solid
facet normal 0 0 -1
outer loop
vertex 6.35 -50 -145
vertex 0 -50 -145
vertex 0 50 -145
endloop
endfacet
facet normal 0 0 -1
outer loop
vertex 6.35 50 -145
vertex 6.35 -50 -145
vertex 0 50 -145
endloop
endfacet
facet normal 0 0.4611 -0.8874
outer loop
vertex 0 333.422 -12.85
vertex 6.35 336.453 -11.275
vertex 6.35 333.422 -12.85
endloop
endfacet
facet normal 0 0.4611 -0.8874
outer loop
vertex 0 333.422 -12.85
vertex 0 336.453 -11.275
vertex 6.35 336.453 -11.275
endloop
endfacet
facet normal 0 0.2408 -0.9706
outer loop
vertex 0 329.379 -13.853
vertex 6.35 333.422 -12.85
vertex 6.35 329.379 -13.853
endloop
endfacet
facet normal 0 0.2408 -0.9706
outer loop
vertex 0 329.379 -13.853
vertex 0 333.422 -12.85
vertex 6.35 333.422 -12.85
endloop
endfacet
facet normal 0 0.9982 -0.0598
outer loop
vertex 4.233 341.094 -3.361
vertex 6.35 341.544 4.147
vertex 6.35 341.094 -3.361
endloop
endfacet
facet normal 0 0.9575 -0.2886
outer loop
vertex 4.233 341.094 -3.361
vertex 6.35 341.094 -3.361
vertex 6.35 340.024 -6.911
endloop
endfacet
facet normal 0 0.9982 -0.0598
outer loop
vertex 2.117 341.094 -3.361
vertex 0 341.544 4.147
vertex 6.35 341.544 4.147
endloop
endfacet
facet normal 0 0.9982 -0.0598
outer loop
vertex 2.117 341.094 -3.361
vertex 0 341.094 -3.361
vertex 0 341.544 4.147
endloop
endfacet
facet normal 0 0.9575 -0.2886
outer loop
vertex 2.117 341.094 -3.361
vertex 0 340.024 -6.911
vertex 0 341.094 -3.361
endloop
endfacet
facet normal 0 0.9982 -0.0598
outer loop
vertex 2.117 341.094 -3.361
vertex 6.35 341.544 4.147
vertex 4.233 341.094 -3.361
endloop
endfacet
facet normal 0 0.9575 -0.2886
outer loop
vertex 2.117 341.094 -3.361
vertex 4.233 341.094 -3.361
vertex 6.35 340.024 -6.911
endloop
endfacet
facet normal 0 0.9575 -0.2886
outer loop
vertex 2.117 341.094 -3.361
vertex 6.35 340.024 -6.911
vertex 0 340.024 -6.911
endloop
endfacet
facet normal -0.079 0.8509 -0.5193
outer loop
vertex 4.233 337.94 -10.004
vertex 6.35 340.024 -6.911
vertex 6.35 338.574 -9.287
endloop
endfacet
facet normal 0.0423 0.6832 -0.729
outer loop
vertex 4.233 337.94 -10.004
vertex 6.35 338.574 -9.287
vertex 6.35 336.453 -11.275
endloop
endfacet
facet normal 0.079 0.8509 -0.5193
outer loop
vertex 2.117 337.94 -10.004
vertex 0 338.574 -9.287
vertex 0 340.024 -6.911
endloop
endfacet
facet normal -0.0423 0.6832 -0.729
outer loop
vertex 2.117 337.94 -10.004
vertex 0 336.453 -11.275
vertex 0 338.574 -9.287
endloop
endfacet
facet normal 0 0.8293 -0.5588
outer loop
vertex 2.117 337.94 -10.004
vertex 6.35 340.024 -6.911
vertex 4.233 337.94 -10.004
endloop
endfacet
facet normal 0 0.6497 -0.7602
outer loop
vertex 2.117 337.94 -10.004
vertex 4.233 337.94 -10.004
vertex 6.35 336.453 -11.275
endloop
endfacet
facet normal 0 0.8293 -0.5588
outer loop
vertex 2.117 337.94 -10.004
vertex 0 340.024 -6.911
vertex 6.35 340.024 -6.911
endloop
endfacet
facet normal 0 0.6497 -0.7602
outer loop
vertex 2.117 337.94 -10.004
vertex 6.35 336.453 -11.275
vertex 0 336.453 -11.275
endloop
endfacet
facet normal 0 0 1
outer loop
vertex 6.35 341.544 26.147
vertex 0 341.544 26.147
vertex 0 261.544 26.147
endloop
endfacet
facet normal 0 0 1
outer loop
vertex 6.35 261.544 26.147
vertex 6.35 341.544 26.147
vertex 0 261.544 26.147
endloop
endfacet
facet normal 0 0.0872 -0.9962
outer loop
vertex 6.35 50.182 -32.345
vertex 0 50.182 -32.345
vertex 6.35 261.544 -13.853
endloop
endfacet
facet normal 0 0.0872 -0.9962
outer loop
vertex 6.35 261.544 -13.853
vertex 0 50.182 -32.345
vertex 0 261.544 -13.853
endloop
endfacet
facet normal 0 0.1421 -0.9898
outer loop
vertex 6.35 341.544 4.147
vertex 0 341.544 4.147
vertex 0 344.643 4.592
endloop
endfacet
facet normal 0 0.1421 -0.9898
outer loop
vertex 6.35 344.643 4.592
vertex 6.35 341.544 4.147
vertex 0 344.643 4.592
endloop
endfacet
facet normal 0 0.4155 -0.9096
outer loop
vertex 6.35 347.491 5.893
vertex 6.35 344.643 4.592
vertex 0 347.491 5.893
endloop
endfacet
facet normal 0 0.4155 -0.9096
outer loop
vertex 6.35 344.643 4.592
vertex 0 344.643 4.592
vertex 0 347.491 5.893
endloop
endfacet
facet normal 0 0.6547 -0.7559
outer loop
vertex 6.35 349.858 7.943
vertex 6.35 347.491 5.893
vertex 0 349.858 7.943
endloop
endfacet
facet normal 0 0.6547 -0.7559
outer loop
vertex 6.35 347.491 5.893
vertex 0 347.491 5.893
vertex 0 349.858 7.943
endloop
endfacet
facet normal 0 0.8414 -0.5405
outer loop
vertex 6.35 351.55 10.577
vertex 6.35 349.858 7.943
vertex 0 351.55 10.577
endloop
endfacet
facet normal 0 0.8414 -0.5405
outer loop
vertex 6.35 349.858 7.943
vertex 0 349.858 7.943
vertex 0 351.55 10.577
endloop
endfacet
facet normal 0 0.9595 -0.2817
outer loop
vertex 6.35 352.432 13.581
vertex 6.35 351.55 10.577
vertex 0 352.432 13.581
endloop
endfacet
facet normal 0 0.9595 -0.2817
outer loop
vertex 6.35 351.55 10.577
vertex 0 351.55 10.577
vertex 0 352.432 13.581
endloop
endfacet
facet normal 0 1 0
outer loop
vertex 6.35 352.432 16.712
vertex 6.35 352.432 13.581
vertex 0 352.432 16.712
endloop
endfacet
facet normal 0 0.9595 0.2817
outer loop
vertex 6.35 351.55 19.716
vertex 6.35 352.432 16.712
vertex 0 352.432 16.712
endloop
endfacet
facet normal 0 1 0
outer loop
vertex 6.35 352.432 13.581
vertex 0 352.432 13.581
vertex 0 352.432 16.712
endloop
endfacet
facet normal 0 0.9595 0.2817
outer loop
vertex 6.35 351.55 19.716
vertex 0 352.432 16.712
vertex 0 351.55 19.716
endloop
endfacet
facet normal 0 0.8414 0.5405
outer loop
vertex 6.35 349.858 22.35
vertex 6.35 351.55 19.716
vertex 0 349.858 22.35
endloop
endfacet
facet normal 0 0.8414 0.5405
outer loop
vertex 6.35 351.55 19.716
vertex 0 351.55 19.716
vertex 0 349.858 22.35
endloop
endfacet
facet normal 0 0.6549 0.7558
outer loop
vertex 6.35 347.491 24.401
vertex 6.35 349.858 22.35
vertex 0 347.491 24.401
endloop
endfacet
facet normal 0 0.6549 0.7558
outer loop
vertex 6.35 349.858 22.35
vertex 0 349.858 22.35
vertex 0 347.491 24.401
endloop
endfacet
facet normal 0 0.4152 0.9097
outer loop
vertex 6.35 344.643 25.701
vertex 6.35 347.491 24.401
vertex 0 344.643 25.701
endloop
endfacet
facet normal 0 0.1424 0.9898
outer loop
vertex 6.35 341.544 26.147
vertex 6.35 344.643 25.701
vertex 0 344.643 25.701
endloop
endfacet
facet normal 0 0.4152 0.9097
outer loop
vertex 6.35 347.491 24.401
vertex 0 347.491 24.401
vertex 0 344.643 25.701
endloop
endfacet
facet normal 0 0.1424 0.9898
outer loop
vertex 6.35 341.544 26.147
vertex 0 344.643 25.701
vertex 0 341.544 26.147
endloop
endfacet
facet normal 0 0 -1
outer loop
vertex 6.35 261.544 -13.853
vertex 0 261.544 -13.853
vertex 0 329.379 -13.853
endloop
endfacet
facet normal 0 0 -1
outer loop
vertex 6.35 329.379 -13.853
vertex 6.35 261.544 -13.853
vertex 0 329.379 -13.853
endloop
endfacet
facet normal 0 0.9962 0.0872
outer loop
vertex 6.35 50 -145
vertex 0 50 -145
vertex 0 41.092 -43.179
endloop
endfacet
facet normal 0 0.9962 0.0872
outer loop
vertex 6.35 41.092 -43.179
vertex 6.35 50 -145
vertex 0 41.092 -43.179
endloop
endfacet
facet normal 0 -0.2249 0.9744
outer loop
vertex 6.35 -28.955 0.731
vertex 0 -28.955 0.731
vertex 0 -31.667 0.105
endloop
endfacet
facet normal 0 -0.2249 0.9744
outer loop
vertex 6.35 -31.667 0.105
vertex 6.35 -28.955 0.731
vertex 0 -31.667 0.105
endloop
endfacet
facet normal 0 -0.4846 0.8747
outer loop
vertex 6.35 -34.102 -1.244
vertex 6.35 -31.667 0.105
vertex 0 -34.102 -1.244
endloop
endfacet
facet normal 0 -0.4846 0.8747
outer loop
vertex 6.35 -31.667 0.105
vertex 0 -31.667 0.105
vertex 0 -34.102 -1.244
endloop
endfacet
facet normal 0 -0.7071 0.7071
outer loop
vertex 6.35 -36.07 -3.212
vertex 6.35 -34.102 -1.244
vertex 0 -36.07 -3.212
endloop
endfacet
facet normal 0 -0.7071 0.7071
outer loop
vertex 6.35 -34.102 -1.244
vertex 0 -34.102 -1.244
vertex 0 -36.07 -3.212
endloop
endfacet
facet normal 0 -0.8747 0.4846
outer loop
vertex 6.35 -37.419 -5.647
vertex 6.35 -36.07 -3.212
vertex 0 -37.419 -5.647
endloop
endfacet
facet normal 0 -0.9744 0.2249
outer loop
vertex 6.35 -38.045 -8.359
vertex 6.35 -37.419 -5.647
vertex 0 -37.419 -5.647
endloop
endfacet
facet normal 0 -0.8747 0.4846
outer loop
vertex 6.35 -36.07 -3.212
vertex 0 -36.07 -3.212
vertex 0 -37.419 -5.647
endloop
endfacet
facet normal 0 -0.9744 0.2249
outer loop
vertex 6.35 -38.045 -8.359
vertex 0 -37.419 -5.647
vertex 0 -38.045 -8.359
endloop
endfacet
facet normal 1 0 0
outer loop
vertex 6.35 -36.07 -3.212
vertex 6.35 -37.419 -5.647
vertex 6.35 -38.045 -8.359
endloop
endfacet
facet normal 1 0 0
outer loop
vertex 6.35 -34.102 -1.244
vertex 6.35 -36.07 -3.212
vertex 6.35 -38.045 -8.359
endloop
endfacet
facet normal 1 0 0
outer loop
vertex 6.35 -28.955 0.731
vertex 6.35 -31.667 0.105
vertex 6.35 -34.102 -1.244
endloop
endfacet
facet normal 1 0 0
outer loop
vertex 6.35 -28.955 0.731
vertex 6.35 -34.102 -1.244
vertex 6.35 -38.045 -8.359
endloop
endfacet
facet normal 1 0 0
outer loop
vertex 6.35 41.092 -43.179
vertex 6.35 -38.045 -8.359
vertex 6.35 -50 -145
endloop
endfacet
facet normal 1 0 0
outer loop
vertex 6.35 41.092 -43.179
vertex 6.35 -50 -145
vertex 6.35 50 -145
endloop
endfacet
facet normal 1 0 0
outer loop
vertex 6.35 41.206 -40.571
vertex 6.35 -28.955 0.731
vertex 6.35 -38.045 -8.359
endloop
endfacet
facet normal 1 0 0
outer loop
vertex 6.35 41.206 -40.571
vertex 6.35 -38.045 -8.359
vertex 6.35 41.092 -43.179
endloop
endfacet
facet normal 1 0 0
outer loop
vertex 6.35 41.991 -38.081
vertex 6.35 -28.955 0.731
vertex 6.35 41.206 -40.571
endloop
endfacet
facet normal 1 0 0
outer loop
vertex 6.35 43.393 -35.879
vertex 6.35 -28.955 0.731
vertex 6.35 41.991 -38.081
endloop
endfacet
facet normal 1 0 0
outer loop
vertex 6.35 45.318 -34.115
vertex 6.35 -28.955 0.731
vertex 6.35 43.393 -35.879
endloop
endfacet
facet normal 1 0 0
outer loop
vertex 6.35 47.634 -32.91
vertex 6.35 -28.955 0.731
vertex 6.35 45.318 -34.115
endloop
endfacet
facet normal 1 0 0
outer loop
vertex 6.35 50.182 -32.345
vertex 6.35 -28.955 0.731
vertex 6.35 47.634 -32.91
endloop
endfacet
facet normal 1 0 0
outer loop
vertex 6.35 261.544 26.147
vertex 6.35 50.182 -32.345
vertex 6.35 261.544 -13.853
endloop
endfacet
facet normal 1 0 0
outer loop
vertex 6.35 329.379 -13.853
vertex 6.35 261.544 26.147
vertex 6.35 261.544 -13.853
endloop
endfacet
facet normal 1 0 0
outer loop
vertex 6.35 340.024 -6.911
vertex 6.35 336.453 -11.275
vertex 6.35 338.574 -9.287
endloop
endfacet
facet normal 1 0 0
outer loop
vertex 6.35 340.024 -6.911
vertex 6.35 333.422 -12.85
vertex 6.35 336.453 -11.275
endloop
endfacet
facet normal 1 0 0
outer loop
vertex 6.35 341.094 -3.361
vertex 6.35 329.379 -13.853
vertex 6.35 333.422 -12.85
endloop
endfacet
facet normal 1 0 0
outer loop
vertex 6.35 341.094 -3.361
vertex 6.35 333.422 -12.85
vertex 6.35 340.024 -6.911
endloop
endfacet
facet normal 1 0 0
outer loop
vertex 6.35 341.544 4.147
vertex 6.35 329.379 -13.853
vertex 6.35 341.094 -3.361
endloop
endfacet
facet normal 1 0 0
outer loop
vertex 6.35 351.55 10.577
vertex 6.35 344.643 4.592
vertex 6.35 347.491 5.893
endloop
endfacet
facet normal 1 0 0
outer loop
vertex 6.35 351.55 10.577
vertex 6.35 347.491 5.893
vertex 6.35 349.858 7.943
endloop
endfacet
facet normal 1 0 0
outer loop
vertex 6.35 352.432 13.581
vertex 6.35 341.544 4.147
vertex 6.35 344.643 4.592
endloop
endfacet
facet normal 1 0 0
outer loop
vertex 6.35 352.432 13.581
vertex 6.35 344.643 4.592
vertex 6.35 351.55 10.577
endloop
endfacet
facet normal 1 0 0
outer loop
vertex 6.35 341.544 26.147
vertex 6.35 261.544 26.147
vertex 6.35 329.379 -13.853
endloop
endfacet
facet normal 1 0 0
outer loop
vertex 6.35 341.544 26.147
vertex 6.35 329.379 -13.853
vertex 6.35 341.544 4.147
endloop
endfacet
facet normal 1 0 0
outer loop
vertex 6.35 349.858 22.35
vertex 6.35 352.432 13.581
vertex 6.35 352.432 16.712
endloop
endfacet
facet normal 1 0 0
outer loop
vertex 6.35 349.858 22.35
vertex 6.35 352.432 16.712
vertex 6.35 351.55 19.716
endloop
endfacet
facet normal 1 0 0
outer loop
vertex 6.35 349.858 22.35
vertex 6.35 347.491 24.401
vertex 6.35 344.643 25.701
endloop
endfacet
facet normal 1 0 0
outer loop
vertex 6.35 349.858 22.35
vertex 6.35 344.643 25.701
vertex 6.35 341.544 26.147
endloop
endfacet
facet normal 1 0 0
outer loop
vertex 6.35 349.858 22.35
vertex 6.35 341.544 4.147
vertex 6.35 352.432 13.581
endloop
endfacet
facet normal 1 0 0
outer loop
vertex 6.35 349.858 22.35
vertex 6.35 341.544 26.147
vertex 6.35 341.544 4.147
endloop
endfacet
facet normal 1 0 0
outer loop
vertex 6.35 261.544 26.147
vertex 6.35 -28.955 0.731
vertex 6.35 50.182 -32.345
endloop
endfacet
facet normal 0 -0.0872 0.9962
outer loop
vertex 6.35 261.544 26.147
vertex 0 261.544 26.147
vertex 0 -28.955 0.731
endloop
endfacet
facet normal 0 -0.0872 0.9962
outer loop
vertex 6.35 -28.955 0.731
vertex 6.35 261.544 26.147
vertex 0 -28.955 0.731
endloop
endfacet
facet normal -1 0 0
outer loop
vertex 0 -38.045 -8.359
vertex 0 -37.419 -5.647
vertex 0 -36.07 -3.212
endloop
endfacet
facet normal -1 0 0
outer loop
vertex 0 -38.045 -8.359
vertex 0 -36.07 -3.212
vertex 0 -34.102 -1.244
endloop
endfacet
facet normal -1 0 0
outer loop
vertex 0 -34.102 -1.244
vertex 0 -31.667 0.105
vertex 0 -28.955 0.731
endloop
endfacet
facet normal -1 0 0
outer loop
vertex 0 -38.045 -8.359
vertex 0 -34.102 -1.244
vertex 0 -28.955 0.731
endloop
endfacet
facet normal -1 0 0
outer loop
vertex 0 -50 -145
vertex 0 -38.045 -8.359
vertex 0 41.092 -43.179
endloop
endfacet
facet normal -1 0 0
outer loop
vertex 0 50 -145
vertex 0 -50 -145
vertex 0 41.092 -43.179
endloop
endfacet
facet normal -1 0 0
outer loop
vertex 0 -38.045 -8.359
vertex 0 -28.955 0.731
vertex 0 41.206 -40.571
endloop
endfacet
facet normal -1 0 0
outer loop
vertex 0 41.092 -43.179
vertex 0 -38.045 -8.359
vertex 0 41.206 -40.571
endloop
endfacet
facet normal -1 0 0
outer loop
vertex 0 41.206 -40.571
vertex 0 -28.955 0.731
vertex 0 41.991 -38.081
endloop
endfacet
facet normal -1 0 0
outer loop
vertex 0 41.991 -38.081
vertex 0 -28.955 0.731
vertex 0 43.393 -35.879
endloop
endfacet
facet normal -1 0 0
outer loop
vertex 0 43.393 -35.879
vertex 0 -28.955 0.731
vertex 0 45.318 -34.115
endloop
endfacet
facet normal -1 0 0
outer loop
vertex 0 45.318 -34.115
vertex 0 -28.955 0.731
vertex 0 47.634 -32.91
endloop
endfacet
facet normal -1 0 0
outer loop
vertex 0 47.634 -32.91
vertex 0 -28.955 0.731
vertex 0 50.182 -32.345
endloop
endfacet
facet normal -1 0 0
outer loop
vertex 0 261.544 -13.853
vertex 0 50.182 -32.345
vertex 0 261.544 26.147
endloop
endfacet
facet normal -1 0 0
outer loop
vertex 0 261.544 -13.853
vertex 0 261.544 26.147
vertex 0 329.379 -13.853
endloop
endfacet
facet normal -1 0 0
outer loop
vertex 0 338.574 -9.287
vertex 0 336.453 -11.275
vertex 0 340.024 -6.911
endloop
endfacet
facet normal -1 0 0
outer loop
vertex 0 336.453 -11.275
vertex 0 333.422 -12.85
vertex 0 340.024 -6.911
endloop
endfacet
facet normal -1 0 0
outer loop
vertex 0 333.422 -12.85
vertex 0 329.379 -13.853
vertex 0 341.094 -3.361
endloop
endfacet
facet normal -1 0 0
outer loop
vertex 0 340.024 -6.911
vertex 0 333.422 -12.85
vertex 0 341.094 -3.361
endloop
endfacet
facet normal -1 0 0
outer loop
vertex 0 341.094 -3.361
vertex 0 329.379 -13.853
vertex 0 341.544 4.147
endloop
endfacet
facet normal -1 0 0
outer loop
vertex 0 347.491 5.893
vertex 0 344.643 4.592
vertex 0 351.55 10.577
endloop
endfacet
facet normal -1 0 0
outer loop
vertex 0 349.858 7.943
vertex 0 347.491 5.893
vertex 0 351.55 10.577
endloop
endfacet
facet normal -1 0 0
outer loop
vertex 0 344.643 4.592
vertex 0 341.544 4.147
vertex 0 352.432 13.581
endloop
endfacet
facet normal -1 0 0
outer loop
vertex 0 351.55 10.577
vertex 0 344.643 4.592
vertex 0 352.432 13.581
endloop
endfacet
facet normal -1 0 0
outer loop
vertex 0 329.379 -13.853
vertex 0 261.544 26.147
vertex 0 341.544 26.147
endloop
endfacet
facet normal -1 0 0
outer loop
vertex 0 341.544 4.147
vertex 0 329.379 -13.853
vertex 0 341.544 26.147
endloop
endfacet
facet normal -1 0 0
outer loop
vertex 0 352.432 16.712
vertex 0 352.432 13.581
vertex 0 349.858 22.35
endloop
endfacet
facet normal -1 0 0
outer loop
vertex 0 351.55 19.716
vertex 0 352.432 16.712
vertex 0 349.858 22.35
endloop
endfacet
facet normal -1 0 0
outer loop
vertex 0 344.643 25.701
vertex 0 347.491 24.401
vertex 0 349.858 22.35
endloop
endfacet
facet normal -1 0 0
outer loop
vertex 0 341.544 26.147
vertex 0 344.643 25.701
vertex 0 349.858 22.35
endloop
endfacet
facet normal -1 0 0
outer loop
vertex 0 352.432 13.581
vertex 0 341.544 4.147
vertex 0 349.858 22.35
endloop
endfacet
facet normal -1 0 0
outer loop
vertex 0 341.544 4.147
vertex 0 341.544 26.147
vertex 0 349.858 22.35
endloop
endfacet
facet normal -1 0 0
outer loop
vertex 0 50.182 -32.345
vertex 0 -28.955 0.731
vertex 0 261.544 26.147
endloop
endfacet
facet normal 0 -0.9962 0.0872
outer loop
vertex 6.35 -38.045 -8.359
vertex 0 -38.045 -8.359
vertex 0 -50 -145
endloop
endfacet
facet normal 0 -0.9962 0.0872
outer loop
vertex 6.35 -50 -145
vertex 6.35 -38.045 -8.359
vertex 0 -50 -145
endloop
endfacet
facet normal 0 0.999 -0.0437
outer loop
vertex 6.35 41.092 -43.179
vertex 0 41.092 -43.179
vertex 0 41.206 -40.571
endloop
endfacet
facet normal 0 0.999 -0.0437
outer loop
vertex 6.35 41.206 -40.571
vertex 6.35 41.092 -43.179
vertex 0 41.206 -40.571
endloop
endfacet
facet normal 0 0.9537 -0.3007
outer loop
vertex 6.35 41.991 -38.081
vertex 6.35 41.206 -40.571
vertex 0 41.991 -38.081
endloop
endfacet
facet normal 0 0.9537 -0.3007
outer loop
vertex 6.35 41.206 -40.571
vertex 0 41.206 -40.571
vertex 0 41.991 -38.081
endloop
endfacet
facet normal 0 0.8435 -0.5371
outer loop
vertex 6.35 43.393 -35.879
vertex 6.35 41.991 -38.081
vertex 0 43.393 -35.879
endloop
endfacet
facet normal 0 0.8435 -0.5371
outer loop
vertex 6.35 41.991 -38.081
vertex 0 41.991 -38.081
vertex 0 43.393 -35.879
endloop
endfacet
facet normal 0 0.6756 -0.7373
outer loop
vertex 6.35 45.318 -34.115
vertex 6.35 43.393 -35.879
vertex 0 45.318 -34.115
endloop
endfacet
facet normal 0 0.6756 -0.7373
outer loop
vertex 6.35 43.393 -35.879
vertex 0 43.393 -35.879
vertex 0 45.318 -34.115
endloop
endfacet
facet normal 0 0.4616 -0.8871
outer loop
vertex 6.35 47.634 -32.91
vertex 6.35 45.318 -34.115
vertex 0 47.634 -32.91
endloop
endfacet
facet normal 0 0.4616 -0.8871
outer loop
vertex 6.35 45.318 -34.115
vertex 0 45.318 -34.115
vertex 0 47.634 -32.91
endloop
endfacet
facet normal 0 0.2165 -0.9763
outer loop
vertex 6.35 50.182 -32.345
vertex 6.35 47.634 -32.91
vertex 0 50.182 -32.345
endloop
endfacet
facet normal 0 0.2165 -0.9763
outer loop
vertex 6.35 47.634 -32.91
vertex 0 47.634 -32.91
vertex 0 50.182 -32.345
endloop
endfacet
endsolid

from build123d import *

# Parameters (mm, degrees)
F1_DEPTH = 6.35


with BuildPart() as f1:
    # F0 (on Right) → F1 (new body)
    with BuildSketch(Plane.YZ):
        with BuildLine():
            ThreePointArc((-28.955078, 0.731324), (-35.154588, -2.159556), (-38.045467, -8.359066))
            Line((-38.045467, -8.359066), (-50, -145))
            Line((-50, -145), (50, -145))
            Line((50, -145), (41.091779, -43.178569))
            ThreePointArc((41.091779, -43.178569), (43.393282, -35.879135), (50.182169, -32.345065))
            Line((50.182169, -32.345065), (261.544266, -13.853277))
            Line((261.544266, -13.853277), (329.379022, -13.853277))
            add(Edge.make_bspline(
                [(341.544266, 4.146723), (341.544266, -3.148999), (341.544266, -12.045636), (329.379022, -13.853277)],
                knots=[0, 0, 0, 0, 21.725403, 21.725403, 21.725403, 21.725403], degree=3))
            Line((341.544266, 4.146723), (341.544266, 26.146723))
            Line((341.544266, 26.146723), (261.544266, 26.146723))
            Line((261.544266, 26.146723), (-28.955078, 0.731324))
        make_face()
        with BuildLine():
            ThreePointArc((341.544266, 4.146723), (352.544266, 15.146723), (341.544266, 26.146723))
            Line((341.544266, 26.146723), (341.544266, 4.146723))
        make_face()
    extrude(amount=F1_DEPTH)


solid = f1.part
